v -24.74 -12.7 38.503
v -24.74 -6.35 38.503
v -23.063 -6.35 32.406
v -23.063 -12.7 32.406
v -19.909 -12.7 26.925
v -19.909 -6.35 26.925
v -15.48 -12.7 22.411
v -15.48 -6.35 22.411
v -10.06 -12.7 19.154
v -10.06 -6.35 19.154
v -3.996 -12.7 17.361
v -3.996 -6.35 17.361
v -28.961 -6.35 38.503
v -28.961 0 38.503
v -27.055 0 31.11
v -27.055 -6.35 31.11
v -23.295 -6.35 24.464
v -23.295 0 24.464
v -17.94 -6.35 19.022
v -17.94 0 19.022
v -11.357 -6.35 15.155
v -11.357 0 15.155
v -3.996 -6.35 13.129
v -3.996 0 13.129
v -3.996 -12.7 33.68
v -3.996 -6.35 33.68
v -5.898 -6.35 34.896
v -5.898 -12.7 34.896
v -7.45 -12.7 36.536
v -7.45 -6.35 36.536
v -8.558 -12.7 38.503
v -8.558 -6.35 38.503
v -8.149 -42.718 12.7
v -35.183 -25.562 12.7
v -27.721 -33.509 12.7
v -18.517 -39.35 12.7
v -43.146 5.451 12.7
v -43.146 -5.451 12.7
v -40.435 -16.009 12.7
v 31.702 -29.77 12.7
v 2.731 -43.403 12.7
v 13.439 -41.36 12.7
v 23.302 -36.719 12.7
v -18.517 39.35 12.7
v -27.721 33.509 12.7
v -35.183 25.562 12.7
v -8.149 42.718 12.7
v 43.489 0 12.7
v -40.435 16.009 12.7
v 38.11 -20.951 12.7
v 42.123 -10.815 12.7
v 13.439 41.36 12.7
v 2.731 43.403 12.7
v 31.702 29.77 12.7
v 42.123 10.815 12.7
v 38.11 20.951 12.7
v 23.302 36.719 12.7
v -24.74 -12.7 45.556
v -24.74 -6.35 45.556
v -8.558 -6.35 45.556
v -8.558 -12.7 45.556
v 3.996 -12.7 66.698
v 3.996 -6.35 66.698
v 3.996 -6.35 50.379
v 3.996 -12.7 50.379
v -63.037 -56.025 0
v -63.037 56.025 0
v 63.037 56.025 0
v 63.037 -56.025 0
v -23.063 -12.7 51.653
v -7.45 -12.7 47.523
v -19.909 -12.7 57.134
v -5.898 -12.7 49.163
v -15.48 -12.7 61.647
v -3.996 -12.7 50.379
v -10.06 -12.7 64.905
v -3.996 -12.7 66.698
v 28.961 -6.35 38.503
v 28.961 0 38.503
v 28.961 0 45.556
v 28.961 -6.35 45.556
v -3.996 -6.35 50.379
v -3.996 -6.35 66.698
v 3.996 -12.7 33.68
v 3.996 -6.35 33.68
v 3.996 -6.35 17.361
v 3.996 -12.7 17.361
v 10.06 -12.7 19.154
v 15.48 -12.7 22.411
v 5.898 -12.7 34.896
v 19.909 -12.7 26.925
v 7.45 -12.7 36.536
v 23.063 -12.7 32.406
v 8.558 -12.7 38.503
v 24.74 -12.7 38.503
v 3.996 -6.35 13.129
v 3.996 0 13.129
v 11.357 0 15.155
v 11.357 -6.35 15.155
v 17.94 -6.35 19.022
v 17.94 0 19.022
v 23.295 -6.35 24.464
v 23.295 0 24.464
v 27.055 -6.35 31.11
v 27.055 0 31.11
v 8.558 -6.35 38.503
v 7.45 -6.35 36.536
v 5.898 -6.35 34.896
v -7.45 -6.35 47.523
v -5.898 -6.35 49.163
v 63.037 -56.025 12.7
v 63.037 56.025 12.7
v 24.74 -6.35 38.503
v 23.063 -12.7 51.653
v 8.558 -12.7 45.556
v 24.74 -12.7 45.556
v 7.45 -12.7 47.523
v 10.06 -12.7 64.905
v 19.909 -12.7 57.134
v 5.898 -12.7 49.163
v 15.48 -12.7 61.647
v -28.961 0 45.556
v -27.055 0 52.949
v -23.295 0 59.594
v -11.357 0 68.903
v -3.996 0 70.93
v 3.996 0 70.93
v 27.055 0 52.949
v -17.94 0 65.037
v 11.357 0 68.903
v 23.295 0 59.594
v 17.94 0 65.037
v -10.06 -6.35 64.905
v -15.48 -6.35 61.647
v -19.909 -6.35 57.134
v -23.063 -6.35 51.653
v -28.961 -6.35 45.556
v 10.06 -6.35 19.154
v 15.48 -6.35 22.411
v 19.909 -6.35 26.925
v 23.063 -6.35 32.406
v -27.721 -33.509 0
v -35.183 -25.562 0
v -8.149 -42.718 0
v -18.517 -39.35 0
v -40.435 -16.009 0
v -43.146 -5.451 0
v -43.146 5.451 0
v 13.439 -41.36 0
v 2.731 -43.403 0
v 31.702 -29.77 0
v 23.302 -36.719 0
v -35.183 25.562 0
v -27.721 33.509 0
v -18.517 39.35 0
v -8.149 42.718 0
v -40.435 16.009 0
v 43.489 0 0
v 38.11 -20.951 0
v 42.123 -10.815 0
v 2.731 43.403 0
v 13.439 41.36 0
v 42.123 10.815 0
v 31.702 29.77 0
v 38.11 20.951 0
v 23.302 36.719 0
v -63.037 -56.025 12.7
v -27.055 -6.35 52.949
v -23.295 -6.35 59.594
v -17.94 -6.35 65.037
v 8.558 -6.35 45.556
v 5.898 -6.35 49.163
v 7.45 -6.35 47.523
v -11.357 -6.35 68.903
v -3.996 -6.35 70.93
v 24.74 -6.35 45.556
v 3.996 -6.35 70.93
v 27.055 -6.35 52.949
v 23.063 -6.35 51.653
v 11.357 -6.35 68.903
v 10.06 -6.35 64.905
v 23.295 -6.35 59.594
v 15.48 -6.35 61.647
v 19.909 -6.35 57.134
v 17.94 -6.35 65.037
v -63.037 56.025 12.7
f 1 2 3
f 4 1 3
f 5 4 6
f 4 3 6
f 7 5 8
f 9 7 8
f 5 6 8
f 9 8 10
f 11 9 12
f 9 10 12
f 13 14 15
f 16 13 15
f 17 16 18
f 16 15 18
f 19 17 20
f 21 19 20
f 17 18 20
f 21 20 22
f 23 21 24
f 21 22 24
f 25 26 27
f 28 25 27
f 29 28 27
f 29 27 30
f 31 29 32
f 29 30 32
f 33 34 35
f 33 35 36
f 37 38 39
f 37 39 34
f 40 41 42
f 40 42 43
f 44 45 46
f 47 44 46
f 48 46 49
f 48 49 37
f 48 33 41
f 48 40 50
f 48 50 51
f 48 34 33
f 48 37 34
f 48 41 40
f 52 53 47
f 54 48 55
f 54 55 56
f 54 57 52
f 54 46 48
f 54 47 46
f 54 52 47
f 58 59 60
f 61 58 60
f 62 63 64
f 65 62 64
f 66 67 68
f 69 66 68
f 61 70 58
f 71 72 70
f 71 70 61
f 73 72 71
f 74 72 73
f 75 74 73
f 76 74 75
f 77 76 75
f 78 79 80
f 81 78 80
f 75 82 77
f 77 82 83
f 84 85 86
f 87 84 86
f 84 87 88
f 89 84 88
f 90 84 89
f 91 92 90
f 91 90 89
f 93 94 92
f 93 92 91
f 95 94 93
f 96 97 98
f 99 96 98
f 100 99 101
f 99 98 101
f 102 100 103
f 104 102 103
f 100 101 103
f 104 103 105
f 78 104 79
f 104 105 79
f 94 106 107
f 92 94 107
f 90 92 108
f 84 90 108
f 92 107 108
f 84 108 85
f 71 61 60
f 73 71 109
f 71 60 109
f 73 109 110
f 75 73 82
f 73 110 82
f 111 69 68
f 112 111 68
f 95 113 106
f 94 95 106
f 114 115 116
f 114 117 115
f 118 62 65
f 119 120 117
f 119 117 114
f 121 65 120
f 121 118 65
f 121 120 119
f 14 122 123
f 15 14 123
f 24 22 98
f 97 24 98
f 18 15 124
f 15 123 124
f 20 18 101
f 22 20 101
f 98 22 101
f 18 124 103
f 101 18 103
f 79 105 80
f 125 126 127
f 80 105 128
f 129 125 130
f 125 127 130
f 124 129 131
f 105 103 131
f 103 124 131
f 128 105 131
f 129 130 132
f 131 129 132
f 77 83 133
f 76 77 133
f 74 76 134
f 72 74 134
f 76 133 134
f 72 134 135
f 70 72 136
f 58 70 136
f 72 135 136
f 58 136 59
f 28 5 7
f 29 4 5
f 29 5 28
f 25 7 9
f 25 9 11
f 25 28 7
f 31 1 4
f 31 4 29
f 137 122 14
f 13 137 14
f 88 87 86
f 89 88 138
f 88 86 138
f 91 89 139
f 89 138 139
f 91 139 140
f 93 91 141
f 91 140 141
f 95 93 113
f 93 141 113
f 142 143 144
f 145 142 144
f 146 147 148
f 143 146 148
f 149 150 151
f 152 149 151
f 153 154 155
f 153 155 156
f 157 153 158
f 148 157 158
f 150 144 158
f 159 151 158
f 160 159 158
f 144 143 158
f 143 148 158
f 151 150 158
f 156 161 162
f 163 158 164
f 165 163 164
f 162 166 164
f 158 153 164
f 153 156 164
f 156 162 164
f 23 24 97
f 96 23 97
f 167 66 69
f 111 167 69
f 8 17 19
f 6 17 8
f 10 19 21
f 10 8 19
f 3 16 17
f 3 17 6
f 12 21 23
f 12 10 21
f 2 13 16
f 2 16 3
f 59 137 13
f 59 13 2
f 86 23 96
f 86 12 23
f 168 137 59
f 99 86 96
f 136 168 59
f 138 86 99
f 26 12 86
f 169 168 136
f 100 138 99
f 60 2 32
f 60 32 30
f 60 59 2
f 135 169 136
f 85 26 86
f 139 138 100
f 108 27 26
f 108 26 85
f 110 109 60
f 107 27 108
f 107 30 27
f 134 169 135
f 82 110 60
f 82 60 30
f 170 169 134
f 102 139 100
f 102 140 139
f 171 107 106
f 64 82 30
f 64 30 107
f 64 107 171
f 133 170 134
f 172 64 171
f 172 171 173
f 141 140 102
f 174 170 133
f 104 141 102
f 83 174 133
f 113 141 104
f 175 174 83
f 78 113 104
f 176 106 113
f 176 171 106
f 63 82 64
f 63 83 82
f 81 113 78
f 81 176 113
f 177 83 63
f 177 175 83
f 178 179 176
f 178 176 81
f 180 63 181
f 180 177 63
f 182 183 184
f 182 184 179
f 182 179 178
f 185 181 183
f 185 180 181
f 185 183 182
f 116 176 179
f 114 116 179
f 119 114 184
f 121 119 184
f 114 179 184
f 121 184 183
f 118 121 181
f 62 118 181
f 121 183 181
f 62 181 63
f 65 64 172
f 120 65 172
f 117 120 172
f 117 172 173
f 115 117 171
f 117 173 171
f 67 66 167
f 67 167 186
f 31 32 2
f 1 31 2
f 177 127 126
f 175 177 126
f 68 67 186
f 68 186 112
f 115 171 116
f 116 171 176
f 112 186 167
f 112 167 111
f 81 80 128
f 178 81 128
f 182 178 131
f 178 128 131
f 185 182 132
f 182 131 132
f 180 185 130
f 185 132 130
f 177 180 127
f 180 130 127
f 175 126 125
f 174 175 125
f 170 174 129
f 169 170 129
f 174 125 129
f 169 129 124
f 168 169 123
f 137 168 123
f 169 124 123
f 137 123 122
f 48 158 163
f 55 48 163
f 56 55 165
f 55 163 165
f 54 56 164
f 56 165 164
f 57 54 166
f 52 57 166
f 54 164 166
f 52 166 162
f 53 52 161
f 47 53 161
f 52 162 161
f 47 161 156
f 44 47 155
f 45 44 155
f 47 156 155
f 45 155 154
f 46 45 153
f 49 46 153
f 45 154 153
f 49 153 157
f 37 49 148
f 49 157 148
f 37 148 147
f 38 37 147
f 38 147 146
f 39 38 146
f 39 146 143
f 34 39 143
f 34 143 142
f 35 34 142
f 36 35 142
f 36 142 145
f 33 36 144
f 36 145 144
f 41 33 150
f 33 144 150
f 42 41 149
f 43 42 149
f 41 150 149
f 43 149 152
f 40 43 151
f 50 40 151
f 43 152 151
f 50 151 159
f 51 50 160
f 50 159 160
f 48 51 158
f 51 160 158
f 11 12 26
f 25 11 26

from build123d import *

# Parameters (mm, degrees)
F0_W     = 126.0746121407
F0_H     = 112.0492890477
F0_R     = 43.4887997988
F1_DEPTH = 12.7
F2_W     = 7.9912188114
F2_H     = 7.0527186902
F3_DEPTH = 6.35
F4_DEPTH = 6.35
F5_DEPTH = 12.7
F6_DEPTH = 6.35
F7_DEPTH = 12.7


with BuildPart() as f1:
    # F0 (on Top) → F1 (new body)
    with BuildSketch(Plane.XY):
        Rectangle(F0_W, F0_H)
        Circle(F0_R, mode=Mode.SUBTRACT)
        Circle(F0_R)
    extrude(amount=F1_DEPTH)


with BuildPart() as f3:
    # F2 (on Front) → F3 (new body)
    with BuildSketch(Plane.XZ):
        with BuildLine():
            Line((-3.9956094057, 66.6977111369), (-3.9956094057, 70.9296574744))
            ThreePointArc((-3.9956094057, 70.9296574744), (-20.7966081428, 62.4913572227), (-28.961308652, 45.5557103411))
            Line((-28.961308652, 45.5557103411), (-24.73979944, 45.5557103411))
            ThreePointArc((-24.73979944, 45.5557103411), (-17.8375160769, 59.5312339452), (-3.9956094057, 66.6977111369))
        make_face()
        with BuildLine():
            ThreePointArc((-28.961308652, 38.5029916509), (-20.7966081428, 21.5673447693), (-3.9956094057, 13.1290445176))
            Line((-3.9956094057, 13.1290445176), (-3.9956094057, 17.3609908552))
            ThreePointArc((-3.9956094057, 17.3609908552), (-17.8375160769, 24.5274680468), (-24.73979944, 38.5029916509))
            Line((-24.73979944, 38.5029916509), (-28.961308652, 38.5029916509))
        make_face()
        with BuildLine():
            Line((-24.73979944, 45.5557103411), (-28.961308652, 45.5557103411))
            Line((-28.961308652, 45.5557103411), (-28.961308652, 38.5029916509))
            Line((-28.961308652, 38.5029916509), (-24.73979944, 38.5029916509))
            ThreePointArc((-24.73979944, 38.5029916509), (-24.9898556731, 42.029350996), (-24.73979944, 45.5557103411))
        make_face()
        with BuildLine():
            Line((-3.9956094057, 13.1290445176), (3.9956094057, 13.1290445176))
            Line((3.9956094057, 13.1290445176), (3.9956094057, 17.3609908552))
            ThreePointArc((3.9956094057, 17.3609908552), (0, 17.0394953229), (-3.9956094057, 17.3609908552))
            Line((-3.9956094057, 17.3609908552), (-3.9956094057, 13.1290445176))
        make_face()
        with BuildLine():
            ThreePointArc((3.9956094057, 13.1290445176), (20.7966081428, 21.5673447693), (28.961308652, 38.5029916509))
            Line((28.961308652, 38.5029916509), (24.73979944, 38.5029916509))
            ThreePointArc((24.73979944, 38.5029916509), (17.8375160769, 24.5274680468), (3.9956094057, 17.3609908552))
            Line((3.9956094057, 17.3609908552), (3.9956094057, 13.1290445176))
        make_face()
        with BuildLine():
            Line((24.73979944, 45.5557103411), (28.961308652, 45.5557103411))
            ThreePointArc((28.961308652, 45.5557103411), (20.7966081428, 62.4913572227), (3.9956094057, 70.9296574744))
            Line((3.9956094057, 70.9296574744), (3.9956094057, 66.6977111369))
            ThreePointArc((3.9956094057, 66.6977111369), (17.8375160769, 59.5312339452), (24.73979944, 45.5557103411))
        make_face()
        with BuildLine():
            Line((3.9956094057, 66.6977111369), (3.9956094057, 70.9296574744))
            Line((3.9956094057, 70.9296574744), (-3.9956094057, 70.9296574744))
            Line((-3.9956094057, 70.9296574744), (-3.9956094057, 66.6977111369))
            ThreePointArc((-3.9956094057, 66.6977111369), (0, 67.0192066691), (3.9956094057, 66.6977111369))
        make_face()
        with BuildLine():
            Line((28.961308652, 38.5029916509), (28.961308652, 45.5557103411))
            Line((28.961308652, 45.5557103411), (24.73979944, 45.5557103411))
            ThreePointArc((24.73979944, 45.5557103411), (24.9272632267, 43.796958019), (24.9898556731, 42.029350996))
            ThreePointArc((24.9898556731, 42.029350996), (24.9272632267, 40.2617439731), (24.73979944, 38.5029916509))
            Line((24.73979944, 38.5029916509), (28.961308652, 38.5029916509))
        make_face()
        with BuildLine():
            Line((3.9956094057, 50.3787178999), (3.9956094057, 66.6977111369))
            ThreePointArc((3.9956094057, 66.6977111369), (0, 67.0192066691), (-3.9956094057, 66.6977111369))
            Line((-3.9956094057, 66.6977111369), (-3.9956094057, 50.3787178999))
            ThreePointArc((-3.9956094057, 50.3787178999), (0, 51.2855285126), (3.9956094057, 50.3787178999))
        make_face()
        with BuildLine():
            Line((3.9956094057, 45.5557103411), (3.9956094057, 50.3787178999))
            ThreePointArc((3.9956094057, 50.3787178999), (0, 51.2855285126), (-3.9956094057, 50.3787178999))
            Line((-3.9956094057, 50.3787178999), (-3.9956094057, 45.5557103411))
            Line((-3.9956094057, 45.5557103411), (3.9956094057, 45.5557103411))
        make_face()
        with Locations((0, 42.029350996)):
            Rectangle(F2_W, F2_H)
        with BuildLine():
            ThreePointArc((-3.9956094057, 33.6799840921), (0, 32.7731734794), (3.9956094057, 33.6799840921))
            Line((3.9956094057, 33.6799840921), (3.9956094057, 38.5029916509))
            Line((3.9956094057, 38.5029916509), (-3.9956094057, 38.5029916509))
            Line((-3.9956094057, 38.5029916509), (-3.9956094057, 33.6799840921))
        make_face()
        with BuildLine():
            ThreePointArc((9.2561775166, 42.029350996), (9.0799891269, 43.8267434614), (8.5581313374, 45.5557103411))
            Line((8.5581313374, 45.5557103411), (3.9956094057, 45.5557103411))
            Line((3.9956094057, 45.5557103411), (3.9956094057, 38.5029916509))
            Line((3.9956094057, 38.5029916509), (8.5581313374, 38.5029916509))
            ThreePointArc((8.5581313374, 38.5029916509), (9.0799891269, 40.2319585306), (9.2561775166, 42.029350996))
        make_face()
        with BuildLine():
            Line((3.9956094057, 45.5557103411), (8.5581313374, 45.5557103411))
            ThreePointArc((8.5581313374, 45.5557103411), (6.7241692527, 48.3903548539), (3.9956094057, 50.3787178999))
            Line((3.9956094057, 50.3787178999), (3.9956094057, 45.5557103411))
        make_face()
        with BuildLine():
            ThreePointArc((3.9956094057, 33.6799840921), (6.7241692527, 35.6683471382), (8.5581313374, 38.5029916509))
            Line((8.5581313374, 38.5029916509), (3.9956094057, 38.5029916509))
            Line((3.9956094057, 38.5029916509), (3.9956094057, 33.6799840921))
        make_face()
        with BuildLine():
            ThreePointArc((-8.5581313374, 38.5029916509), (-6.7241692527, 35.6683471382), (-3.9956094057, 33.6799840921))
            Line((-3.9956094057, 33.6799840921), (-3.9956094057, 38.5029916509))
            Line((-3.9956094057, 38.5029916509), (-8.5581313374, 38.5029916509))
        make_face()
        with BuildLine():
            Line((-3.9956094057, 38.5029916509), (-3.9956094057, 45.5557103411))
            Line((-3.9956094057, 45.5557103411), (-8.5581313374, 45.5557103411))
            ThreePointArc((-8.5581313374, 45.5557103411), (-9.2561775166, 42.029350996), (-8.5581313374, 38.5029916509))
            Line((-8.5581313374, 38.5029916509), (-3.9956094057, 38.5029916509))
        make_face()
        with BuildLine():
            Line((-3.9956094057, 45.5557103411), (-3.9956094057, 50.3787178999))
            ThreePointArc((-3.9956094057, 50.3787178999), (-6.7241692527, 48.3903548539), (-8.5581313374, 45.5557103411))
            Line((-8.5581313374, 45.5557103411), (-3.9956094057, 45.5557103411))
        make_face()
        with BuildLine():
            Line((-8.5581313374, 45.5557103411), (-24.73979944, 45.5557103411))
            ThreePointArc((-24.73979944, 45.5557103411), (-24.9898556731, 42.029350996), (-24.73979944, 38.5029916509))
            Line((-24.73979944, 38.5029916509), (-8.5581313374, 38.5029916509))
            ThreePointArc((-8.5581313374, 38.5029916509), (-9.2561775166, 42.029350996), (-8.5581313374, 45.5557103411))
        make_face()
        with BuildLine():
            ThreePointArc((-3.9956094057, 17.3609908552), (0, 17.0394953229), (3.9956094057, 17.3609908552))
            Line((3.9956094057, 17.3609908552), (3.9956094057, 33.6799840921))
            ThreePointArc((3.9956094057, 33.6799840921), (0, 32.7731734794), (-3.9956094057, 33.6799840921))
            Line((-3.9956094057, 33.6799840921), (-3.9956094057, 17.3609908552))
        make_face()
        with BuildLine():
            ThreePointArc((24.9898556731, 42.029350996), (24.9272632267, 43.796958019), (24.73979944, 45.5557103411))
            Line((24.73979944, 45.5557103411), (8.5581313374, 45.5557103411))
            ThreePointArc((8.5581313374, 45.5557103411), (9.0799891269, 43.8267434614), (9.2561775166, 42.029350996))
            ThreePointArc((9.2561775166, 42.029350996), (9.0799891269, 40.2319585306), (8.5581313374, 38.5029916509))
            Line((8.5581313374, 38.5029916509), (24.73979944, 38.5029916509))
            ThreePointArc((24.73979944, 38.5029916509), (24.9272632267, 40.2617439731), (24.9898556731, 42.029350996))
        make_face()
    extrude(amount=F3_DEPTH)

    # F4 (add): a face of the model
    f4_faces = [f3.faces().sort_by_distance(p)[0] for p in [
        (0, -6.35, 42.029350996),
    ]]
    extrude(f4_faces, amount=-F4_DEPTH)

    # F2 (on Front) → F5 (join)
    with BuildSketch(Plane.XZ):
        with BuildLine():
            Line((-3.9956094057, 50.3787178999), (-3.9956094057, 66.6977111369))
            ThreePointArc((-3.9956094057, 66.6977111369), (-17.8375160769, 59.5312339452), (-24.73979944, 45.5557103411))
            Line((-24.73979944, 45.5557103411), (-8.5581313374, 45.5557103411))
            ThreePointArc((-8.5581313374, 45.5557103411), (-6.7241692527, 48.3903548539), (-3.9956094057, 50.3787178999))
        make_face()
        with BuildLine():
            Line((8.5581313374, 45.5557103411), (24.73979944, 45.5557103411))
            ThreePointArc((24.73979944, 45.5557103411), (17.8375160769, 59.5312339452), (3.9956094057, 66.6977111369))
            Line((3.9956094057, 66.6977111369), (3.9956094057, 50.3787178999))
            ThreePointArc((3.9956094057, 50.3787178999), (6.7241692527, 48.3903548539), (8.5581313374, 45.5557103411))
        make_face()
        with BuildLine():
            ThreePointArc((3.9956094057, 17.3609908552), (17.8375160769, 24.5274680468), (24.73979944, 38.5029916509))
            Line((24.73979944, 38.5029916509), (8.5581313374, 38.5029916509))
            ThreePointArc((8.5581313374, 38.5029916509), (6.7241692527, 35.6683471382), (3.9956094057, 33.6799840921))
            Line((3.9956094057, 33.6799840921), (3.9956094057, 17.3609908552))
        make_face()
        with BuildLine():
            ThreePointArc((-24.73979944, 38.5029916509), (-17.8375160769, 24.5274680468), (-3.9956094057, 17.3609908552))
            Line((-3.9956094057, 17.3609908552), (-3.9956094057, 33.6799840921))
            ThreePointArc((-3.9956094057, 33.6799840921), (-6.7241692527, 35.6683471382), (-8.5581313374, 38.5029916509))
            Line((-8.5581313374, 38.5029916509), (-24.73979944, 38.5029916509))
        make_face()
    extrude(amount=F5_DEPTH)

    # F2 (on Front) → F6 (join)
    with BuildSketch(Plane.XZ):
        with BuildLine():
            Line((8.5581313374, 45.5557103411), (24.73979944, 45.5557103411))
            ThreePointArc((24.73979944, 45.5557103411), (17.8375160769, 59.5312339452), (3.9956094057, 66.6977111369))
            Line((3.9956094057, 66.6977111369), (3.9956094057, 50.3787178999))
            ThreePointArc((3.9956094057, 50.3787178999), (6.7241692527, 48.3903548539), (8.5581313374, 45.5557103411))
        make_face()
        with BuildLine():
            Line((-3.9956094057, 50.3787178999), (-3.9956094057, 66.6977111369))
            ThreePointArc((-3.9956094057, 66.6977111369), (-17.8375160769, 59.5312339452), (-24.73979944, 45.5557103411))
            Line((-24.73979944, 45.5557103411), (-8.5581313374, 45.5557103411))
            ThreePointArc((-8.5581313374, 45.5557103411), (-6.7241692527, 48.3903548539), (-3.9956094057, 50.3787178999))
        make_face()
        with BuildLine():
            ThreePointArc((-24.73979944, 38.5029916509), (-17.8375160769, 24.5274680468), (-3.9956094057, 17.3609908552))
            Line((-3.9956094057, 17.3609908552), (-3.9956094057, 33.6799840921))
            ThreePointArc((-3.9956094057, 33.6799840921), (-6.7241692527, 35.6683471382), (-8.5581313374, 38.5029916509))
            Line((-8.5581313374, 38.5029916509), (-24.73979944, 38.5029916509))
        make_face()
        with BuildLine():
            ThreePointArc((3.9956094057, 17.3609908552), (17.8375160769, 24.5274680468), (24.73979944, 38.5029916509))
            Line((24.73979944, 38.5029916509), (8.5581313374, 38.5029916509))
            ThreePointArc((8.5581313374, 38.5029916509), (6.7241692527, 35.6683471382), (3.9956094057, 33.6799840921))
            Line((3.9956094057, 33.6799840921), (3.9956094057, 17.3609908552))
        make_face()
    extrude(amount=F6_DEPTH)


with BuildPart() as f7:
    # F0 (on Top) → F7 (new body)
    with BuildSketch(Plane.XY):
        Circle(F0_R)
    extrude(amount=F7_DEPTH)


solid = Compound([f1.part, f3.part, f7.part])
